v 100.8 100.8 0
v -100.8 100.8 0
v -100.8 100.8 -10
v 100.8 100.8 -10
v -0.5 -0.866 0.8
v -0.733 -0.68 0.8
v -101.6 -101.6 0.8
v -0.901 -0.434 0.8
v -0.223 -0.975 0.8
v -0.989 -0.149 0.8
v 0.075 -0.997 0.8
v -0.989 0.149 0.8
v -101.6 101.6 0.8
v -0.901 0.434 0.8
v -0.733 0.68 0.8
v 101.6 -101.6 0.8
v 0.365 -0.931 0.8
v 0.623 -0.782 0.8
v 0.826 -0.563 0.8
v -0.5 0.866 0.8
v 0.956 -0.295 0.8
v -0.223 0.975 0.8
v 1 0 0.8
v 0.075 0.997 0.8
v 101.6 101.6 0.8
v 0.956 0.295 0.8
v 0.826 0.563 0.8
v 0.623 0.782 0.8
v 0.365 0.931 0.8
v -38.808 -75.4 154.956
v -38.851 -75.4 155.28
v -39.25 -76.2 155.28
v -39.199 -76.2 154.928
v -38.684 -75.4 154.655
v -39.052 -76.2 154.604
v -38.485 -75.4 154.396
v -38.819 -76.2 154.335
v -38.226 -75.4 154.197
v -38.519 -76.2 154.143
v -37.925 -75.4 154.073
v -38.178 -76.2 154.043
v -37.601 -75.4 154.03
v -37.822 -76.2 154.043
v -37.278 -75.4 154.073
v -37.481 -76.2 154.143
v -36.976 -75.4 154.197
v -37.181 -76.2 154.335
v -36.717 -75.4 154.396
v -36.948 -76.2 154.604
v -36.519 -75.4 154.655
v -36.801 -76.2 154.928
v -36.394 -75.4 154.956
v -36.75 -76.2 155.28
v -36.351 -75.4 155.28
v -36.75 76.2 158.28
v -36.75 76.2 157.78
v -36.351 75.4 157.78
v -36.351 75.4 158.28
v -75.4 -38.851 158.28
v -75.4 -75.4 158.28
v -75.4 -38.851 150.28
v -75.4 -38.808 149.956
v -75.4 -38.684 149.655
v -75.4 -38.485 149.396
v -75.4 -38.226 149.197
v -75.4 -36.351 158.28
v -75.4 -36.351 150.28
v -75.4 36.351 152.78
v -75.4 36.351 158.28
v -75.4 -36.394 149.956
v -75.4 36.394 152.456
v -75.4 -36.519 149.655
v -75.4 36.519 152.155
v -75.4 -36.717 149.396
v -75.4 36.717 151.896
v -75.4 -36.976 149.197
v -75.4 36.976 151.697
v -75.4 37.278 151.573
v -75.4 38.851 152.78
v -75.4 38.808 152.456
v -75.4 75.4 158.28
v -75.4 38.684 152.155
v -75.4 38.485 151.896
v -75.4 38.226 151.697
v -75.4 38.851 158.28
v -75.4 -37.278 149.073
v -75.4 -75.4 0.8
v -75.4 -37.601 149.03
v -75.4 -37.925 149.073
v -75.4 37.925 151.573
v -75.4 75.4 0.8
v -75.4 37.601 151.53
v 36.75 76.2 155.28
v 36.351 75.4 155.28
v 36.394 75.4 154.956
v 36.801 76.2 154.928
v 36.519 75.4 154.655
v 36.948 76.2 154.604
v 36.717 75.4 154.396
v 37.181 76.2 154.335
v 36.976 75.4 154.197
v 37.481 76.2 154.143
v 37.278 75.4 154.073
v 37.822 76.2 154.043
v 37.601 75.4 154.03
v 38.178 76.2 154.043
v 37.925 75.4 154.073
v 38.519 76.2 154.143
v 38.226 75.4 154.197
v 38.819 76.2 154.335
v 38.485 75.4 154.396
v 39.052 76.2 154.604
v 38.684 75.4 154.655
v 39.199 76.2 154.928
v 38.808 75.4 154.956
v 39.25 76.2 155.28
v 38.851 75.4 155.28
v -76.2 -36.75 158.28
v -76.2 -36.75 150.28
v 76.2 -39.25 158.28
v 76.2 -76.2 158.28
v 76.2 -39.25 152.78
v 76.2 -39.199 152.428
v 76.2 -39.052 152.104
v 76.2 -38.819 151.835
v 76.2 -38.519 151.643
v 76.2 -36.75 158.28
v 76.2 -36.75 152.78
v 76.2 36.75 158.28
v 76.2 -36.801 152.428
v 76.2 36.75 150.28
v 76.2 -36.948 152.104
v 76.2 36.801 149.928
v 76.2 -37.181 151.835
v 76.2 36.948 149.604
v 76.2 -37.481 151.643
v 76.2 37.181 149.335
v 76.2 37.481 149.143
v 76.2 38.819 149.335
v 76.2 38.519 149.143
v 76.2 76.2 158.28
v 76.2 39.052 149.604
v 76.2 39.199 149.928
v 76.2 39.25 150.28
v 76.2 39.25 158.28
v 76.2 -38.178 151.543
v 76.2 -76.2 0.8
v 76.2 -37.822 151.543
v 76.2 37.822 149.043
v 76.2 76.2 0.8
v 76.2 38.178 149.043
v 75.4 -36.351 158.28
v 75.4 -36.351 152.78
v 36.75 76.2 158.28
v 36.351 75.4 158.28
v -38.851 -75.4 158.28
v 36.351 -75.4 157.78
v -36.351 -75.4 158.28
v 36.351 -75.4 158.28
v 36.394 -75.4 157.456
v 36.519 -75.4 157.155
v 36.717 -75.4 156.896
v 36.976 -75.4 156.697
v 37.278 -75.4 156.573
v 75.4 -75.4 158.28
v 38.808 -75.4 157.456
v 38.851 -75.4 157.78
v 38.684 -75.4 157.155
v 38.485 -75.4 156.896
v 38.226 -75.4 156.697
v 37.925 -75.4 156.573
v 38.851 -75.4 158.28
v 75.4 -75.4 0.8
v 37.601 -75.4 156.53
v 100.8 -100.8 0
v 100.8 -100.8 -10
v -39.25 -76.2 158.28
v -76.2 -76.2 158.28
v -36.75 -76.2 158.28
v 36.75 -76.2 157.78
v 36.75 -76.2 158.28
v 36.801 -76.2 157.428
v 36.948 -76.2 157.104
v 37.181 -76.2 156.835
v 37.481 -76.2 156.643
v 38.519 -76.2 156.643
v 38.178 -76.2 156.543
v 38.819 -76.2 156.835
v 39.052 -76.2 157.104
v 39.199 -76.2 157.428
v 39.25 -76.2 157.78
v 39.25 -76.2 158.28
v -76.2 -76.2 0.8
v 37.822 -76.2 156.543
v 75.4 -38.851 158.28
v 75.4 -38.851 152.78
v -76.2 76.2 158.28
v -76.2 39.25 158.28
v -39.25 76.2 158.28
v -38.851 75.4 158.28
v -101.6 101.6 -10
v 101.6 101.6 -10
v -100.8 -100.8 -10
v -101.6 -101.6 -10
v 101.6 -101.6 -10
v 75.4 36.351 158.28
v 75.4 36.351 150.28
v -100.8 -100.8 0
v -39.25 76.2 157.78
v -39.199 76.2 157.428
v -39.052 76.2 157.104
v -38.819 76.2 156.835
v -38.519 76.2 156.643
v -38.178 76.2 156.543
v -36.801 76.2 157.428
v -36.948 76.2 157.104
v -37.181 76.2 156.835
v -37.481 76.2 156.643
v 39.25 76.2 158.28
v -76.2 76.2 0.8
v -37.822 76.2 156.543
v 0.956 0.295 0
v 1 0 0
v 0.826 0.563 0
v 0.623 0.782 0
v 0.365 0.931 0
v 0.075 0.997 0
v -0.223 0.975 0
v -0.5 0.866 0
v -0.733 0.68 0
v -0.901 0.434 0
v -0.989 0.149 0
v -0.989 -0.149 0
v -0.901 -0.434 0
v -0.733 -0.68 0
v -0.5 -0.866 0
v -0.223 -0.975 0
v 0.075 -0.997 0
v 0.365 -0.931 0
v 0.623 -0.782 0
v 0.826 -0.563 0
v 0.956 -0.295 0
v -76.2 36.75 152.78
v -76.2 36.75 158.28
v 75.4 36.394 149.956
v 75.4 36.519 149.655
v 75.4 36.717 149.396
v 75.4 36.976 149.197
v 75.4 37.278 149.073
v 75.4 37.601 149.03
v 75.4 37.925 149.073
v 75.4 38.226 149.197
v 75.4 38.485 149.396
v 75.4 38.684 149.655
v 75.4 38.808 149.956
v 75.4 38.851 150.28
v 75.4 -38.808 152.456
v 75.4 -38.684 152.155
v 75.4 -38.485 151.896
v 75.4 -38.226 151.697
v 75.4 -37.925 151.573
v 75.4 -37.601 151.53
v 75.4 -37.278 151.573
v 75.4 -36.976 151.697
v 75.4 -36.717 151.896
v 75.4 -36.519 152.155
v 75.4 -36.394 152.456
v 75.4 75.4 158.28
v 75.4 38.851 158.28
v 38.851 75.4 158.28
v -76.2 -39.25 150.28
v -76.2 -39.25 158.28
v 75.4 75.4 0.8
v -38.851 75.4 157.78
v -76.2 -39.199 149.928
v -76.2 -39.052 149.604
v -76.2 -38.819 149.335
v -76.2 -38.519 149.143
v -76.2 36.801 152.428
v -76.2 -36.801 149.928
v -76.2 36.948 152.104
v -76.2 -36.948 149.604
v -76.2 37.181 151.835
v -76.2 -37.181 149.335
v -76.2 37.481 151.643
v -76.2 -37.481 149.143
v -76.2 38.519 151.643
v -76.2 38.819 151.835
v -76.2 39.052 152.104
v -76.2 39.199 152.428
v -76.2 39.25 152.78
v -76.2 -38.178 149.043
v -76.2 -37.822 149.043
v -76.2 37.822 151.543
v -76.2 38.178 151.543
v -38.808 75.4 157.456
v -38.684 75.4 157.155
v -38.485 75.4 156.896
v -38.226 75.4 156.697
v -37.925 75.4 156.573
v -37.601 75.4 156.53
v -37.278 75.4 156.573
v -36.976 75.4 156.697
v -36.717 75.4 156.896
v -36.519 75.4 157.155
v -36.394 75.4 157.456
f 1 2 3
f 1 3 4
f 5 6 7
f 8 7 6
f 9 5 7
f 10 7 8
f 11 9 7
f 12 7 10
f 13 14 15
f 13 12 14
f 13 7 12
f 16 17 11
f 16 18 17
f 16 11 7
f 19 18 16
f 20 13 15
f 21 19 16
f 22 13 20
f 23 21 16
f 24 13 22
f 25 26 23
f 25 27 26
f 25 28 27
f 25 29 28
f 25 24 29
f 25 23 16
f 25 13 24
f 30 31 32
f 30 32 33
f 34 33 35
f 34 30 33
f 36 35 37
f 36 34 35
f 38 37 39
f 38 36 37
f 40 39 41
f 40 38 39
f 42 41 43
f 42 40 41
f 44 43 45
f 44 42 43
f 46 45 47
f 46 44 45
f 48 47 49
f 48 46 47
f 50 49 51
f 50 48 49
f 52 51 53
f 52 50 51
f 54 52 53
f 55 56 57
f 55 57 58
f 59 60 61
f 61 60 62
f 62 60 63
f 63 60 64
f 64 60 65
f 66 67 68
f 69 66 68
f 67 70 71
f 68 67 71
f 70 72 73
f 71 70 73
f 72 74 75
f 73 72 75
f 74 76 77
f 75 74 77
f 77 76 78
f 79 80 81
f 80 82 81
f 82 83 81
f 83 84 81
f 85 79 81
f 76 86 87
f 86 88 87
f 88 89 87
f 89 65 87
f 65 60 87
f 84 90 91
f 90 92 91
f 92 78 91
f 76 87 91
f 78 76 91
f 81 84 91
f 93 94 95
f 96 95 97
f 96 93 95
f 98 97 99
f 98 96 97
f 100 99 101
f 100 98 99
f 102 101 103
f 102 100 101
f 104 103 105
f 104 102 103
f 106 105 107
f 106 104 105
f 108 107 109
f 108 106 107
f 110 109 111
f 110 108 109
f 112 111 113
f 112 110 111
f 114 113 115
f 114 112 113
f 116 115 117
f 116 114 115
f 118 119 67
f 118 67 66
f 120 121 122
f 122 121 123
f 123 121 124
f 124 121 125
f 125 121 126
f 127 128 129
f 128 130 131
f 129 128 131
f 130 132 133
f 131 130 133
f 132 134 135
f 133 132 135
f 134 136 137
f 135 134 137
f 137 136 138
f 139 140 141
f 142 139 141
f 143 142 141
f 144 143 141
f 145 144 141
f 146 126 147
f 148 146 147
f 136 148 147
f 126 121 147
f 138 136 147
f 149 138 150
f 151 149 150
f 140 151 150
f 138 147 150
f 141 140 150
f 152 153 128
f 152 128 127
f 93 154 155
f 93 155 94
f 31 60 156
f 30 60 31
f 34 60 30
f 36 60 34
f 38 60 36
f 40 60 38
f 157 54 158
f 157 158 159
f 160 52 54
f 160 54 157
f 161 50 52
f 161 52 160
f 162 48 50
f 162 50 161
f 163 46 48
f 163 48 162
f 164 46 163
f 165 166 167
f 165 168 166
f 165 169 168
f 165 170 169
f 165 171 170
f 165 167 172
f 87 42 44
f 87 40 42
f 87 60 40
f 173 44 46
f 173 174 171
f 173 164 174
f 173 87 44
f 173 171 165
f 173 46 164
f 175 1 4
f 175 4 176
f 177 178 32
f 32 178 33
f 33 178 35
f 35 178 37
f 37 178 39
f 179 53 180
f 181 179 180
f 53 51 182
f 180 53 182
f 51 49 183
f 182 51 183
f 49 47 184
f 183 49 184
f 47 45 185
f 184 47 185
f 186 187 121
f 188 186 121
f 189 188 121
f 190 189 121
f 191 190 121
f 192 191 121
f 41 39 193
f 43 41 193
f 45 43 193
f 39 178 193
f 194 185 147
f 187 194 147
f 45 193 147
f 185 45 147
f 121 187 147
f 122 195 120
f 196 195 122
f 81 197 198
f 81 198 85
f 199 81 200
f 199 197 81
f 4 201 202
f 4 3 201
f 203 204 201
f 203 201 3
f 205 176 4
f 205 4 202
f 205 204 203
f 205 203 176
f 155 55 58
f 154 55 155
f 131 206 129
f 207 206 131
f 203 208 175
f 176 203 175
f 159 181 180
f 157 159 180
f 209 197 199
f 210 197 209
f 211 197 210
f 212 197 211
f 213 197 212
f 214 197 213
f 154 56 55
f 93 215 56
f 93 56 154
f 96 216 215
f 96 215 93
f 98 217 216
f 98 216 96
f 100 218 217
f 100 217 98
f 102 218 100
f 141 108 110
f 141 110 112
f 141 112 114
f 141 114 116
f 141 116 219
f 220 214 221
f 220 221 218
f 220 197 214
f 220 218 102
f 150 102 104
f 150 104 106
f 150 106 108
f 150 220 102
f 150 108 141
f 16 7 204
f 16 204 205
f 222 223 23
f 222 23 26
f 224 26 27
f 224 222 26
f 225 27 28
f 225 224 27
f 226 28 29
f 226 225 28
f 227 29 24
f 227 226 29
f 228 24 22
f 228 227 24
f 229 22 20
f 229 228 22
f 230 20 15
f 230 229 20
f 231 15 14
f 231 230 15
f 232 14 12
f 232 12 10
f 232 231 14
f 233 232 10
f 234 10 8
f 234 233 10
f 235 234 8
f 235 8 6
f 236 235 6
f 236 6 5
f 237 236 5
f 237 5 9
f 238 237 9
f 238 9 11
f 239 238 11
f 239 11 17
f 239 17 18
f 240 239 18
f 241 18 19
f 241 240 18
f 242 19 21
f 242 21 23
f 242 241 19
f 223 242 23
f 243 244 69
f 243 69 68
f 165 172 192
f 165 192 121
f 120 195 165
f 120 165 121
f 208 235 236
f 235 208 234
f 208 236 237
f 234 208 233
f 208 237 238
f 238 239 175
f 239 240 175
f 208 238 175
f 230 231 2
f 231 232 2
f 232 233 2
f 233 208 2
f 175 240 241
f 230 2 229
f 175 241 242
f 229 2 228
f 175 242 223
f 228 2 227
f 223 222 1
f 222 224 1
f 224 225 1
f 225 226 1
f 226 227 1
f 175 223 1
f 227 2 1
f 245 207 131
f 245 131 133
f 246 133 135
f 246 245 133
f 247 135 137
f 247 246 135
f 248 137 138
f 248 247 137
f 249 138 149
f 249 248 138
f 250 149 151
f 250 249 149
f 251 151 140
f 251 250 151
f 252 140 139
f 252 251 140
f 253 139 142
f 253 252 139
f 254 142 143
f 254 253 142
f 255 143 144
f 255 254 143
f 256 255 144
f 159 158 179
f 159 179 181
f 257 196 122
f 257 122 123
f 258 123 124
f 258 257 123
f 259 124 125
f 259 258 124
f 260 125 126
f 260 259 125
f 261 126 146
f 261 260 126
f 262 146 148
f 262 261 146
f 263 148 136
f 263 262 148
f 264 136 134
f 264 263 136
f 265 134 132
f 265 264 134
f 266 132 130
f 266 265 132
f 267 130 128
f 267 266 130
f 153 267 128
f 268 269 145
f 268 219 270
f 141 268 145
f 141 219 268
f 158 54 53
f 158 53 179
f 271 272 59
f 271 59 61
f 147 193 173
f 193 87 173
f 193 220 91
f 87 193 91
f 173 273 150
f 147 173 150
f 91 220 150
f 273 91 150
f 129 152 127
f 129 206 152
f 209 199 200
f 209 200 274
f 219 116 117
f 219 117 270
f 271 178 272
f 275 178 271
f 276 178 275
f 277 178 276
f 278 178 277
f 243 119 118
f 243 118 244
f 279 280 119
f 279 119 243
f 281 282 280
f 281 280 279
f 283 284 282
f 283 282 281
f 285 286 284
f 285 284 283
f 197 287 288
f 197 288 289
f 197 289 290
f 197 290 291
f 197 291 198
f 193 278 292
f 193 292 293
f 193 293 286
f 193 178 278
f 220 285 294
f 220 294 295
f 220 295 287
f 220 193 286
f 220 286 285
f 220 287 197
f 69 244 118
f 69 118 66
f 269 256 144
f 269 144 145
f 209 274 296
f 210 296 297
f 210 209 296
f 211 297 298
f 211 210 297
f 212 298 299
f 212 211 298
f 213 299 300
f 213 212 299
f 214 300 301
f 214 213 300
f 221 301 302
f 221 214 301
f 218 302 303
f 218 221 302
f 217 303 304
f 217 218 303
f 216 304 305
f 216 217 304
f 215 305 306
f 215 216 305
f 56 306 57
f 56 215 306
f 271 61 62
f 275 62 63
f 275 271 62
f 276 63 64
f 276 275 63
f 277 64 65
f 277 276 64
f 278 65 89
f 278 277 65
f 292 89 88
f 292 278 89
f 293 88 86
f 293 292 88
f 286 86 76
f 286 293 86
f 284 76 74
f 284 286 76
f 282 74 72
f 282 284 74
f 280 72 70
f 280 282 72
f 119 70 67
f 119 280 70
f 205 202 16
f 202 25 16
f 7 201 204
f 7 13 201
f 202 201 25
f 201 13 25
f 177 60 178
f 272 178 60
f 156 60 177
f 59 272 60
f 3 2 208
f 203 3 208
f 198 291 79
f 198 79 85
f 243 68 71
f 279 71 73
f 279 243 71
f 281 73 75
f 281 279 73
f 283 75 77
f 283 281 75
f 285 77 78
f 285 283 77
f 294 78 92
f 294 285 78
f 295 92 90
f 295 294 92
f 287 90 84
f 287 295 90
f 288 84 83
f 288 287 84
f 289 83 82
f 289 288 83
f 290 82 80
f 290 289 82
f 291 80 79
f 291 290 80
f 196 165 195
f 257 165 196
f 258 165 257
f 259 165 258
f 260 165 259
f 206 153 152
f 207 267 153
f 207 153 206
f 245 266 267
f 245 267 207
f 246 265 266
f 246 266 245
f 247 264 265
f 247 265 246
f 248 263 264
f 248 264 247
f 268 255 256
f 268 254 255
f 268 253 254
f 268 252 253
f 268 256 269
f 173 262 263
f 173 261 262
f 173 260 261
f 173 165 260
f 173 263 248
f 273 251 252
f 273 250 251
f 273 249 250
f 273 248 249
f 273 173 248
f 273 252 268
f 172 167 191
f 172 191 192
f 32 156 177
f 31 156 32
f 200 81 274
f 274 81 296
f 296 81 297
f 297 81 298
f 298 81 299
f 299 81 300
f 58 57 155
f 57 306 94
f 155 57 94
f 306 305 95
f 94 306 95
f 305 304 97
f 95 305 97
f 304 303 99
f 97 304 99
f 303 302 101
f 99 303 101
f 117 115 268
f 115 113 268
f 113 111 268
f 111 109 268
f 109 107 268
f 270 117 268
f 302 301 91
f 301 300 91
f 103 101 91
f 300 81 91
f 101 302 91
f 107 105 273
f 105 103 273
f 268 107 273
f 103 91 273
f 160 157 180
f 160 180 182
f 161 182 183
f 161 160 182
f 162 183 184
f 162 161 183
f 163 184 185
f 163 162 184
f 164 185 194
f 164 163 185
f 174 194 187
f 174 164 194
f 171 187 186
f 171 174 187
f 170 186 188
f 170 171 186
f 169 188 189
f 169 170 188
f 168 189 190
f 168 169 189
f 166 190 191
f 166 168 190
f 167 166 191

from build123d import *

# Parameters (mm, degrees)
F0_W     = 203.2
F0_H     = 203.2
F0_R     = 1
F1_DEPTH = 0.8
F2_W     = 203.2
F2_H     = 203.2
F2_W_2   = 201.6
F2_H_2   = 201.6
F3_DEPTH = 10
F4_W     = 152.4
F4_H     = 152.4
F4_W_2   = 150.8
F4_H_2   = 150.8
F5_DEPTH = 157.48


with BuildPart() as f1:
    # F0 (on Top) → F1 (new body)
    with BuildSketch(Plane.XY):
        Rectangle(F0_W, F0_H)
        Circle(F0_R, mode=Mode.SUBTRACT)
    extrude(amount=F1_DEPTH)

    # F2 (on face) → F3 (join)
    with BuildSketch(Plane(origin=(0, 0, 0), x_dir=(1, 0, 0), z_dir=(0, 0, -1))):
        Rectangle(F2_W, F2_H)
        Rectangle(F2_W_2, F2_H_2, mode=Mode.SUBTRACT)
    extrude(amount=F3_DEPTH)


with BuildPart() as f5:
    # F4 (on face) → F5 (new body)
    with BuildSketch(Plane.XY.offset(0.8)):
        Rectangle(F4_W, F4_H)
        Rectangle(F4_W_2, F4_H_2, mode=Mode.SUBTRACT)
    extrude(amount=F5_DEPTH)

    # F9: sweep along a path in F8
    with BuildLine(Plane.XY.offset(158.28)) as f9_path:
        Line((38, -76.2), (-38, 76.2))
    # F6 (on face) → F9 (sweep, cut)
    with BuildSketch(Plane.XZ.offset(76.2)):
        with BuildLine():
            Line((39.25, 158.28), (36.75, 158.28))
            Line((36.75, 158.28), (36.75, 157.78))
            ThreePointArc((36.75, 157.78), (38, 156.53), (39.25, 157.78))
            Line((39.25, 157.78), (39.25, 158.28))
        make_face()
    sweep(path=f9_path.line, mode=Mode.SUBTRACT)

    # F10: sweep along a path in F8
    with BuildLine(Plane.XY.offset(158.28)) as f10_path:
        Line((-38, -76.2), (38, 76.2))
    # F6 (on face) → F10 (sweep, cut)
    with BuildSketch(Plane.XZ.offset(76.2)):
        with BuildLine():
            Line((-36.75, 155.28), (-36.75, 158.28))
            Line((-36.75, 158.28), (-39.25, 158.28))
            Line((-39.25, 158.28), (-39.25, 155.28))
            ThreePointArc((-39.25, 155.28), (-38, 154.03), (-36.75, 155.28))
        make_face()
    sweep(path=f10_path.line, mode=Mode.SUBTRACT)

    # F11: sweep along a path in F8
    with BuildLine(Plane.XY.offset(158.28)) as f11_path:
        Line((76.2, -38), (-76.2, 38))
    # F7 (on face) → F11 (sweep, cut)
    with BuildSketch(Plane.YZ.offset(76.2)):
        with BuildLine():
            Line((-36.75, 152.78), (-36.75, 158.28))
            Line((-36.75, 158.28), (-39.25, 158.28))
            Line((-39.25, 158.28), (-39.25, 152.78))
            ThreePointArc((-39.25, 152.78), (-38, 151.53), (-36.75, 152.78))
        make_face()
    sweep(path=f11_path.line, mode=Mode.SUBTRACT)

    # F12: sweep along a path in F8
    with BuildLine(Plane.XY.offset(158.28)) as f12_path:
        Line((76.2, 38), (-76.2, -38))
    # F7 (on face) → F12 (sweep, cut)
    with BuildSketch(Plane.YZ.offset(76.2)):
        with BuildLine():
            ThreePointArc((36.75, 150.28), (38, 149.03), (39.25, 150.28))
            Line((39.25, 150.28), (39.25, 158.28))
            Line((39.25, 158.28), (36.75, 158.28))
            Line((36.75, 158.28), (36.75, 150.28))
        make_face()
    sweep(path=f12_path.line, mode=Mode.SUBTRACT)


solid = Compound([f1.part, f5.part])
